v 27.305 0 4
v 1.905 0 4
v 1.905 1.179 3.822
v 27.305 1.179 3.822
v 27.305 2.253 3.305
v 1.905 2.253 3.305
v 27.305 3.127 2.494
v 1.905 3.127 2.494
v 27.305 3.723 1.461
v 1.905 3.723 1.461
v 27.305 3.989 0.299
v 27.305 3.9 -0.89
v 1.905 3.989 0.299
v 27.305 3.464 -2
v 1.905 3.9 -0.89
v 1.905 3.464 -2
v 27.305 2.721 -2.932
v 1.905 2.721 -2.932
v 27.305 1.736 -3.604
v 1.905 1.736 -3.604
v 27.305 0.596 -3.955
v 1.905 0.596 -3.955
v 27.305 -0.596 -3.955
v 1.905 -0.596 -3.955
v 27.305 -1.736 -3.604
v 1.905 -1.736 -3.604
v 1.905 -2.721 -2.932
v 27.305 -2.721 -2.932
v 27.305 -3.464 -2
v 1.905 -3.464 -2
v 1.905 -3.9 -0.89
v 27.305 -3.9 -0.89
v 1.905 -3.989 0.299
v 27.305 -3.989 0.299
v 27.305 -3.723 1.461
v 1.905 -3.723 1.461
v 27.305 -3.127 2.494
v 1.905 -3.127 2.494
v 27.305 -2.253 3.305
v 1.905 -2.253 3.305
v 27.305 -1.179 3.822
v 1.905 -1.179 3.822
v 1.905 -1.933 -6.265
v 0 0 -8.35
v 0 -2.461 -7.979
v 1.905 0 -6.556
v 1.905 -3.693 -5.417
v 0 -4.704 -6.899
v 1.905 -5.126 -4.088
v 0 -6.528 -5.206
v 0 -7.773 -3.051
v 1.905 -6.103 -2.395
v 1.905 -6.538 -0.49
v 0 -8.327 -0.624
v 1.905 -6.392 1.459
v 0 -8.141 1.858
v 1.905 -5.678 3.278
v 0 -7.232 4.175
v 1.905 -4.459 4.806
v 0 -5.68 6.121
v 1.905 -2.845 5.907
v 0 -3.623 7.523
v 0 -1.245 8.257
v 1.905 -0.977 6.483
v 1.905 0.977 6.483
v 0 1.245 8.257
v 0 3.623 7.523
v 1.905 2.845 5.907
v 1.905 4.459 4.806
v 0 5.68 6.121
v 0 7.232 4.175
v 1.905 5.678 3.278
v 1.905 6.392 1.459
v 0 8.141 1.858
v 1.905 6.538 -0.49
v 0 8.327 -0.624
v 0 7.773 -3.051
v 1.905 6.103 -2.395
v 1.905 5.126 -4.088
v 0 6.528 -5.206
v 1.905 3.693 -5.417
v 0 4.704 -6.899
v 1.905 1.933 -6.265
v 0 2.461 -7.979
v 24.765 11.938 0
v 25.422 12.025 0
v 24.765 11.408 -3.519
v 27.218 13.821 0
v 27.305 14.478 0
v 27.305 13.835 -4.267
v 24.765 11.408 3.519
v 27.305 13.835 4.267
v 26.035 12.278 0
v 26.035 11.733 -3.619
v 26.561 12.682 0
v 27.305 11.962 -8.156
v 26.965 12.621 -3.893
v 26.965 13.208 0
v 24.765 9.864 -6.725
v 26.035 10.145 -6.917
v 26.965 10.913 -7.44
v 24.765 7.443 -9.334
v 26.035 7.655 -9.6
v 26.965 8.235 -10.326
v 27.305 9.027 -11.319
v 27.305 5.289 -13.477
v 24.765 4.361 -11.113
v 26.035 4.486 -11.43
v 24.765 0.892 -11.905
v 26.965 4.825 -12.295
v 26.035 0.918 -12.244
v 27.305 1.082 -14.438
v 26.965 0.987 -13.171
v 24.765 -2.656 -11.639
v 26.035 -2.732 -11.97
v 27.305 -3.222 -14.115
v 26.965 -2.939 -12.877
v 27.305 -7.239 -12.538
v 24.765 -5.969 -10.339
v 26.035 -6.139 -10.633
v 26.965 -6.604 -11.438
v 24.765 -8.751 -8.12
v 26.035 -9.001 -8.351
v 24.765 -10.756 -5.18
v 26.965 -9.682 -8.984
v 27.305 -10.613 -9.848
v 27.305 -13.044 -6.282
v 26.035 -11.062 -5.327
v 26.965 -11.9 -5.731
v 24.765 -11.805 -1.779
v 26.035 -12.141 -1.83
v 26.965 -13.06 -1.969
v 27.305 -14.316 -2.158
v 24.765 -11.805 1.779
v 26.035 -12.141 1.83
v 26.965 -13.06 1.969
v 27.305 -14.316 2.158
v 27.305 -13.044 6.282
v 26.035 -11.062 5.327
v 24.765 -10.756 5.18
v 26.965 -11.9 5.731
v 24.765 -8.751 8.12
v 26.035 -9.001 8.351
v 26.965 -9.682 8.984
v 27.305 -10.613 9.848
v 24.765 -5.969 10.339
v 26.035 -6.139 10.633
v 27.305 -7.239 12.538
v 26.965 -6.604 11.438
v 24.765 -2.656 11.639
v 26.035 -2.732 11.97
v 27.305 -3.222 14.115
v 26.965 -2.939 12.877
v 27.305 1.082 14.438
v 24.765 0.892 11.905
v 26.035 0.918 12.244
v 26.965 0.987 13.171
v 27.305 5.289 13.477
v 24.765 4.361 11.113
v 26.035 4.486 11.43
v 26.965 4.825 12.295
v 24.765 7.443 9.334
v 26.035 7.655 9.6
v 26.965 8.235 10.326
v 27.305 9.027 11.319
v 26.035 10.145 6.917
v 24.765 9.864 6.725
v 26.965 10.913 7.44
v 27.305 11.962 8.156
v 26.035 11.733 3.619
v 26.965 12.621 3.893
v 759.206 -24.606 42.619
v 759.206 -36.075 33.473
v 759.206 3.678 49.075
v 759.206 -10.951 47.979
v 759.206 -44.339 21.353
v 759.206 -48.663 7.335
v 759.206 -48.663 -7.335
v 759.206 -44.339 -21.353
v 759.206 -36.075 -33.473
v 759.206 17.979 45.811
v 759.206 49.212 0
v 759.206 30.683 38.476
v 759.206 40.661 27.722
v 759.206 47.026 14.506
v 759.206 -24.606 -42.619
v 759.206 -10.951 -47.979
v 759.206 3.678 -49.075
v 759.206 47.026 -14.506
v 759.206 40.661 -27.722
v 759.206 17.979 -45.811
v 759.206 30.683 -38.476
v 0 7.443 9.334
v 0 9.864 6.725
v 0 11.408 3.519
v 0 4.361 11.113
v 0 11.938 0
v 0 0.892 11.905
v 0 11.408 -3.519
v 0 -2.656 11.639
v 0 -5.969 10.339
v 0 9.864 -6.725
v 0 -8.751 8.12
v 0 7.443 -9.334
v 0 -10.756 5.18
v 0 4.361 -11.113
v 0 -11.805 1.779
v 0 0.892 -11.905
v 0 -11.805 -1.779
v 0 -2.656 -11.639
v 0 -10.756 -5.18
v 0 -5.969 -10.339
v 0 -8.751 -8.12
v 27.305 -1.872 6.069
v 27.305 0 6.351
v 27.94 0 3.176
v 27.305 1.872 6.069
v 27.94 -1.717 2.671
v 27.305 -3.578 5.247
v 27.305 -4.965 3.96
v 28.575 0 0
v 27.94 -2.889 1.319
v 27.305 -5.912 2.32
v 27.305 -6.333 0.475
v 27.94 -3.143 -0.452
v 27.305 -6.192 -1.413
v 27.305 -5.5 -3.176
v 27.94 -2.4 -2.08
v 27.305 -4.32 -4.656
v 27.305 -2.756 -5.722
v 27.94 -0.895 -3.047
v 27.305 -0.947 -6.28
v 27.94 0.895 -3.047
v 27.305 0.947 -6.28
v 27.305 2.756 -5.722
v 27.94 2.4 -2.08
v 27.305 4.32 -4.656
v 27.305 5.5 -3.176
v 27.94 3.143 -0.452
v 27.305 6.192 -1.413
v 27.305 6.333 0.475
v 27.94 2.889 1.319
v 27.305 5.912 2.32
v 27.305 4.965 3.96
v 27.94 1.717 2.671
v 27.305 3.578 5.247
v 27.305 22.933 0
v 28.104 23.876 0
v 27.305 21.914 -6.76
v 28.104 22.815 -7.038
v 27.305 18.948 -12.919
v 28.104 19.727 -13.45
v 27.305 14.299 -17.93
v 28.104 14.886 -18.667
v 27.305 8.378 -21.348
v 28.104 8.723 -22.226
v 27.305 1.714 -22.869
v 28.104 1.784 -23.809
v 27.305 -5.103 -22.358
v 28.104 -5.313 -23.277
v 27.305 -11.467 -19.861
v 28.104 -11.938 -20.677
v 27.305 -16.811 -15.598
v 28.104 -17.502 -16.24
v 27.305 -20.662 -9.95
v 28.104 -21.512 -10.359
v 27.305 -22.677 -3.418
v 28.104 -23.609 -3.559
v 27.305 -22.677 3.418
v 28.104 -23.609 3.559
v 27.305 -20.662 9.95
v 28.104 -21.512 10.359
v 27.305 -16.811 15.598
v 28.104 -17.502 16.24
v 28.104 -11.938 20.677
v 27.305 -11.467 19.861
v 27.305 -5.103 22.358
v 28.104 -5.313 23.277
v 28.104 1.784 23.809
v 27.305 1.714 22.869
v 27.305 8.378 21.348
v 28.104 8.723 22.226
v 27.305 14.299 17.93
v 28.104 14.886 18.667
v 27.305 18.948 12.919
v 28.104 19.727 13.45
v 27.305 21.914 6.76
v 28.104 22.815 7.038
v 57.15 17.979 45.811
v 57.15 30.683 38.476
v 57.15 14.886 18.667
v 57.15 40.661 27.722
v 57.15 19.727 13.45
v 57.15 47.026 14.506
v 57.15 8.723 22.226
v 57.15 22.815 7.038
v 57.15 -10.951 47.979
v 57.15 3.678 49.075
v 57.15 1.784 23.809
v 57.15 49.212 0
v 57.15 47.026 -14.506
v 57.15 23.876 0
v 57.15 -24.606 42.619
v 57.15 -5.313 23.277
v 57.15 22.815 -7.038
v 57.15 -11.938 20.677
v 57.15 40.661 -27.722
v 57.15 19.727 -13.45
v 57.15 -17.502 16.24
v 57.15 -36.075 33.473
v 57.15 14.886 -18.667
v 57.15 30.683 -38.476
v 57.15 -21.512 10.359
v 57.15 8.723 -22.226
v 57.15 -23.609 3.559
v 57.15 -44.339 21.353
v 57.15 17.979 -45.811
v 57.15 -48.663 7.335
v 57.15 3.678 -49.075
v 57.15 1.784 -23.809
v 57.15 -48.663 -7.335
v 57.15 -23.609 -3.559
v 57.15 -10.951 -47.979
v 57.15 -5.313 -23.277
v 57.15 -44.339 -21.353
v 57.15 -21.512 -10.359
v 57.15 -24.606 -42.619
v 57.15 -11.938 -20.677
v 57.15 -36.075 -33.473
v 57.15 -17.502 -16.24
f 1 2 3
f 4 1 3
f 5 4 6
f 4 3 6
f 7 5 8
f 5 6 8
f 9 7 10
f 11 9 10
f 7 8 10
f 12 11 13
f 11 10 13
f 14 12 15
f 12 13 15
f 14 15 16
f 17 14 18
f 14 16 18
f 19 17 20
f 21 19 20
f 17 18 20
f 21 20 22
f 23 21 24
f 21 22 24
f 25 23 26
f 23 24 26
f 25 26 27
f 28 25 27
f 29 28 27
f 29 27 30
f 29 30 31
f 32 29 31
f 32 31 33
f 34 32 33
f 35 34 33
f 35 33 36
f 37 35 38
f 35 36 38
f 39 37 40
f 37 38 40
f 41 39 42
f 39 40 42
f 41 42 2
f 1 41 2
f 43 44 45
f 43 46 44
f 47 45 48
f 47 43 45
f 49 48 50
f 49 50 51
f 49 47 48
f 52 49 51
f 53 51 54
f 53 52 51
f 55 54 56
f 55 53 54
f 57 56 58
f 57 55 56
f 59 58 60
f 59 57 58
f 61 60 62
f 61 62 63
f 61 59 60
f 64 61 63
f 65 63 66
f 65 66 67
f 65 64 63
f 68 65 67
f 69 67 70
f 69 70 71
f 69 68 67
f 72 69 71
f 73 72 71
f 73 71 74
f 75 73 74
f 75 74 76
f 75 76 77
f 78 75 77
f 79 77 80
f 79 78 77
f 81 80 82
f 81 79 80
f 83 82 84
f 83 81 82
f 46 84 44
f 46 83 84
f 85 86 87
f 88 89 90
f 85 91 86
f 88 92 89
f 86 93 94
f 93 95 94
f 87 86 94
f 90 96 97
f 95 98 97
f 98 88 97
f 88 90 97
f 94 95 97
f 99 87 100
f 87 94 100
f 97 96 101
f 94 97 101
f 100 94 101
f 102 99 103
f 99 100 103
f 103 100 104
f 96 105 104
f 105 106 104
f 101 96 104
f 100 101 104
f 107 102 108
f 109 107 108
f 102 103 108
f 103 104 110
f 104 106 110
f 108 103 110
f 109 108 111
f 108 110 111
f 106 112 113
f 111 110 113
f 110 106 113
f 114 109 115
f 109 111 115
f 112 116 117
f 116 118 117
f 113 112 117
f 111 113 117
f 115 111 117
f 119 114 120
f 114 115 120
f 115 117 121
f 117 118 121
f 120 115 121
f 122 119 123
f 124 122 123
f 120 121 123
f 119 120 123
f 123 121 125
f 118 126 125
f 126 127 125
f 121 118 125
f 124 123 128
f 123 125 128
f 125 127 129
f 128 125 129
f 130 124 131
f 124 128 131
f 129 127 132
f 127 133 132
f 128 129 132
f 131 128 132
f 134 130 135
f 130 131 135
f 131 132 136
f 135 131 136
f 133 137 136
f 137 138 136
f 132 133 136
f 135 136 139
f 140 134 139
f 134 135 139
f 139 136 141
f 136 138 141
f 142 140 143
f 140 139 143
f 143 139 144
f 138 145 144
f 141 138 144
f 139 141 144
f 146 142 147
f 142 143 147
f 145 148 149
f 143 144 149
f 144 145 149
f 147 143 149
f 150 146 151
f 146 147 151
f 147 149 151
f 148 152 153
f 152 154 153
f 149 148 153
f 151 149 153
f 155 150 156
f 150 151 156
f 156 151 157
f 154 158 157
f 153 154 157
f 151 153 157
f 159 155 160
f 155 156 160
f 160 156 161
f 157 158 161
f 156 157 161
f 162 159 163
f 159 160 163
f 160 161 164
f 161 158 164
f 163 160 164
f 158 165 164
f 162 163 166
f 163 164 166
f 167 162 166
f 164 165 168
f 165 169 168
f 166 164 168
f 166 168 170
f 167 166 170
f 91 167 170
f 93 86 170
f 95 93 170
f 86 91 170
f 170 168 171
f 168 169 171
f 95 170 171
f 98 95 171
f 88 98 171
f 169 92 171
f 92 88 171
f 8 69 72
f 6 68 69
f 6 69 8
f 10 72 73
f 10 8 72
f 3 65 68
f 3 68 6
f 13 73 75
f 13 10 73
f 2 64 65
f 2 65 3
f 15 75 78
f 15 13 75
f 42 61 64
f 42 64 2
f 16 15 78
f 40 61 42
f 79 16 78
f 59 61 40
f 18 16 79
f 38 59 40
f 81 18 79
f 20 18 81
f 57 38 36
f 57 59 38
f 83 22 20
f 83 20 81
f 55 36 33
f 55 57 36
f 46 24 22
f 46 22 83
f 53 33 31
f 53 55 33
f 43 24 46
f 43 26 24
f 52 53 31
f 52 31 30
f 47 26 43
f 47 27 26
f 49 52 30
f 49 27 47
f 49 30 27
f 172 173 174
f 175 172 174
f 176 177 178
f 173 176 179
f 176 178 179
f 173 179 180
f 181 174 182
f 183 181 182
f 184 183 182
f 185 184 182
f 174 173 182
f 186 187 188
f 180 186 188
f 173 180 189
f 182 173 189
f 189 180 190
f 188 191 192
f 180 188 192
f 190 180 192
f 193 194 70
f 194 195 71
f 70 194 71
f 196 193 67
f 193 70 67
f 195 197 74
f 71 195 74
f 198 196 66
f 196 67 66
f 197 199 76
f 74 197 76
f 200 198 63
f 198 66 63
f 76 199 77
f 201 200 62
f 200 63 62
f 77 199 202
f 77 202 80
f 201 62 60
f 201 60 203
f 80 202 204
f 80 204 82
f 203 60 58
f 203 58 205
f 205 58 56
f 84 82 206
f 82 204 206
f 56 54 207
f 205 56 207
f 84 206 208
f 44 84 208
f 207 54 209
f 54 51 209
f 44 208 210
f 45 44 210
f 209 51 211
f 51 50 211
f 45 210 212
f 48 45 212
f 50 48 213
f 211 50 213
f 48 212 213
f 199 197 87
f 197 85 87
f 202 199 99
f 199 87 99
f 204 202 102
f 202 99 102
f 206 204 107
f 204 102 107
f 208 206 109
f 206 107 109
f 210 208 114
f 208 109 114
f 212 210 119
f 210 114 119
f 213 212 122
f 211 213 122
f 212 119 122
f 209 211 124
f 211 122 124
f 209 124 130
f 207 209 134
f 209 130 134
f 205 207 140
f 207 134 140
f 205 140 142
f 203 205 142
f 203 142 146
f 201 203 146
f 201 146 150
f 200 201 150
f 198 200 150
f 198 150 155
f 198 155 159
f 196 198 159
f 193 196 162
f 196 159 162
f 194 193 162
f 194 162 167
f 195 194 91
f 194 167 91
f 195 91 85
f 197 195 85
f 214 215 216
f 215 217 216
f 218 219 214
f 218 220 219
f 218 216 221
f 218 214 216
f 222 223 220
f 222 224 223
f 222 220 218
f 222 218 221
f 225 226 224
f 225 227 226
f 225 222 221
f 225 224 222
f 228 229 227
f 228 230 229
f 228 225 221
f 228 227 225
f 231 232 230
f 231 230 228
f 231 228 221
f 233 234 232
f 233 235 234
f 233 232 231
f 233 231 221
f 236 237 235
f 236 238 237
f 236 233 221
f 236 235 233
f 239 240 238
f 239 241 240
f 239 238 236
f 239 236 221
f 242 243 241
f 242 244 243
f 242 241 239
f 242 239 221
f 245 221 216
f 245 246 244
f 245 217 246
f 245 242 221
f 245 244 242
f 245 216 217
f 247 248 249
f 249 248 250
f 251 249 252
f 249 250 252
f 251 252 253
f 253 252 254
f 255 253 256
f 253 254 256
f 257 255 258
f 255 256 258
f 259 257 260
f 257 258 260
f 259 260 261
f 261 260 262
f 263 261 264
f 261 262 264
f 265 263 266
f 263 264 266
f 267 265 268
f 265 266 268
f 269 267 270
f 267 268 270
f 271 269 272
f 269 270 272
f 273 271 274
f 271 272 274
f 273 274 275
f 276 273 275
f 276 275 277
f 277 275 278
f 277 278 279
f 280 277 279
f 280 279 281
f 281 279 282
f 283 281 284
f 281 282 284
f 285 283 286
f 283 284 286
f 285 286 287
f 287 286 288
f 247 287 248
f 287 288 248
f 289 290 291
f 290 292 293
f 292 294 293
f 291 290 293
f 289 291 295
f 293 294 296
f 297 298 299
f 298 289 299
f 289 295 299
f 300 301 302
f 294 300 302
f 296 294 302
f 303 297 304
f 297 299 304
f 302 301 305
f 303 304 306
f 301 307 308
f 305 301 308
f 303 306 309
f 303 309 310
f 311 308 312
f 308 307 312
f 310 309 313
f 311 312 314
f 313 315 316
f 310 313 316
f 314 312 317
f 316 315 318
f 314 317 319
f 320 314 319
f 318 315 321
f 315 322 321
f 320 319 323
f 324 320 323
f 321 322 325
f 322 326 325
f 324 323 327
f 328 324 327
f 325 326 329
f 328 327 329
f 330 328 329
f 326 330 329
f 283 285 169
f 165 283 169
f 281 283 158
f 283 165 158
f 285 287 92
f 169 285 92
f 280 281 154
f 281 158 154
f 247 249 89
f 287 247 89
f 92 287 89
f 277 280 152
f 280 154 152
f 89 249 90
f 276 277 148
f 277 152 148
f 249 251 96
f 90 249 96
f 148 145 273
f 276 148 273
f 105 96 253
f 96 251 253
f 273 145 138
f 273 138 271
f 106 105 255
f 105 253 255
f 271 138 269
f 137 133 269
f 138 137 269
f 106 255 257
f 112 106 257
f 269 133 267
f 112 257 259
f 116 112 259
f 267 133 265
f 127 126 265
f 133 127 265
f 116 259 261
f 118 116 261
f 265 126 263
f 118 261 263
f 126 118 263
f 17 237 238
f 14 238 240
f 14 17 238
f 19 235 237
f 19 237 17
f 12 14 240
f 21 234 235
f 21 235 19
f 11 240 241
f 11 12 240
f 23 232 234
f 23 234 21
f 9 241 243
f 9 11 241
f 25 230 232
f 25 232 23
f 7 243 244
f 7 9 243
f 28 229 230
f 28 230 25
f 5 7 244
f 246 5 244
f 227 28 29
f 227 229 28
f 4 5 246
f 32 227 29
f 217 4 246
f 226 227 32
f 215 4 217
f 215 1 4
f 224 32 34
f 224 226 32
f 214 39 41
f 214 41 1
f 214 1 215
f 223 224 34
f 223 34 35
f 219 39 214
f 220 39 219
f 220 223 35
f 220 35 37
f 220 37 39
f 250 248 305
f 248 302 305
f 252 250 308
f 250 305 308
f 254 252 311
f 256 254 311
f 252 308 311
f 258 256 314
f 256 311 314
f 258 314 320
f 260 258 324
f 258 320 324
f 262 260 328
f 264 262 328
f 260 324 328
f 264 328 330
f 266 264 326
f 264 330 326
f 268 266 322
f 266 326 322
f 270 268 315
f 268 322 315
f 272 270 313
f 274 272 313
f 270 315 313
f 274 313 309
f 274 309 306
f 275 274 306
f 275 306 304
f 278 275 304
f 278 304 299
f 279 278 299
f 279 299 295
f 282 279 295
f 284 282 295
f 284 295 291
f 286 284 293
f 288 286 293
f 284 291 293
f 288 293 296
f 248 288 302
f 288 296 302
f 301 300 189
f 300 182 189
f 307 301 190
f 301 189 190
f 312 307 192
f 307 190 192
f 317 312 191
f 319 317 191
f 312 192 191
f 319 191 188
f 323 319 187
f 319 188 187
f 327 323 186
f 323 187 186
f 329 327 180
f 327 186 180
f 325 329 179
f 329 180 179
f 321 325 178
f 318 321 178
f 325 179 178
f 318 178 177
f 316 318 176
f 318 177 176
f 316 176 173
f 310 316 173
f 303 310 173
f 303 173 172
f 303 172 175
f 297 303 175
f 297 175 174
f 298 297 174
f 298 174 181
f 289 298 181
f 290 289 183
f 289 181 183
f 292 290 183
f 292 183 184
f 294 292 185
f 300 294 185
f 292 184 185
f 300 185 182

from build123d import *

# Parameters (mm, degrees)
SKETCH19_R         = 4
CUT_EXTRUDE3_DEPTH = 25.4


with BuildPart() as part:
    # Sketch1 → Revolve1 (revolve)
    with BuildSketch(Plane.XY):
        with BuildLine():
            Line((0, 0), (0, 11.938))
            Line((0, 11.938), (24.765, 11.938))
            ThreePointArc((24.765, 11.938), (26.561051224, 12.681948776), (27.305, 14.478))
            Line((27.305, 14.478), (27.305, 22.933028409))
            Line((27.305, 22.933028409), (28.104406531, 23.876))
            Line((28.104406531, 23.876), (57.15, 23.876))
            Line((57.15, 23.876), (57.15, 49.2125))
            Line((57.15, 49.2125), (759.206, 49.2125))
            Line((759.206, 49.2125), (759.206, 0))
            Line((759.206, 0), (0, 0))
        make_face()
    revolve(axis=Axis((759.206, 0, 0), (-1, 0, 0)))

    # Sketch16 → Cut-Revolve1 (revolve, cut)
    with BuildSketch(Plane(origin=(0, 0, 0), x_dir=(1, 0, 0), z_dir=(0, 1, 0))):
        Polygon((0, 0), (0, 8.35025), (1.905, 6.556375), (1.905, 0), align=None)
    revolve(axis=Axis((1.905, 0, 0), (-1, 0, 0)), mode=Mode.SUBTRACT)

    # Sketch19 → Cut-Extrude3 (cut)
    with BuildSketch(Plane.ZY.offset(-1.905)):
        Circle(SKETCH19_R)
    extrude(amount=-CUT_EXTRUDE3_DEPTH, mode=Mode.SUBTRACT)

    # Sketch32 → Cut-Revolve6 (revolve, cut)
    with BuildSketch(Plane(origin=(0, 0, 0), x_dir=(1, 0, 0), z_dir=(0, 1, 0)), mode=Mode.PRIVATE) as cut_revolve6_sk:
        Polygon((27.305, 0), (28.575, 0), (27.305, 6.351059428), align=None)
    revolve(cut_revolve6_sk.sketch.rotate(Axis((27.305, 0, 0), (1, 0, 0)), 180), axis=Axis((27.305, 0, 0), (1, 0, 0)), mode=Mode.SUBTRACT)


solid = part.part
